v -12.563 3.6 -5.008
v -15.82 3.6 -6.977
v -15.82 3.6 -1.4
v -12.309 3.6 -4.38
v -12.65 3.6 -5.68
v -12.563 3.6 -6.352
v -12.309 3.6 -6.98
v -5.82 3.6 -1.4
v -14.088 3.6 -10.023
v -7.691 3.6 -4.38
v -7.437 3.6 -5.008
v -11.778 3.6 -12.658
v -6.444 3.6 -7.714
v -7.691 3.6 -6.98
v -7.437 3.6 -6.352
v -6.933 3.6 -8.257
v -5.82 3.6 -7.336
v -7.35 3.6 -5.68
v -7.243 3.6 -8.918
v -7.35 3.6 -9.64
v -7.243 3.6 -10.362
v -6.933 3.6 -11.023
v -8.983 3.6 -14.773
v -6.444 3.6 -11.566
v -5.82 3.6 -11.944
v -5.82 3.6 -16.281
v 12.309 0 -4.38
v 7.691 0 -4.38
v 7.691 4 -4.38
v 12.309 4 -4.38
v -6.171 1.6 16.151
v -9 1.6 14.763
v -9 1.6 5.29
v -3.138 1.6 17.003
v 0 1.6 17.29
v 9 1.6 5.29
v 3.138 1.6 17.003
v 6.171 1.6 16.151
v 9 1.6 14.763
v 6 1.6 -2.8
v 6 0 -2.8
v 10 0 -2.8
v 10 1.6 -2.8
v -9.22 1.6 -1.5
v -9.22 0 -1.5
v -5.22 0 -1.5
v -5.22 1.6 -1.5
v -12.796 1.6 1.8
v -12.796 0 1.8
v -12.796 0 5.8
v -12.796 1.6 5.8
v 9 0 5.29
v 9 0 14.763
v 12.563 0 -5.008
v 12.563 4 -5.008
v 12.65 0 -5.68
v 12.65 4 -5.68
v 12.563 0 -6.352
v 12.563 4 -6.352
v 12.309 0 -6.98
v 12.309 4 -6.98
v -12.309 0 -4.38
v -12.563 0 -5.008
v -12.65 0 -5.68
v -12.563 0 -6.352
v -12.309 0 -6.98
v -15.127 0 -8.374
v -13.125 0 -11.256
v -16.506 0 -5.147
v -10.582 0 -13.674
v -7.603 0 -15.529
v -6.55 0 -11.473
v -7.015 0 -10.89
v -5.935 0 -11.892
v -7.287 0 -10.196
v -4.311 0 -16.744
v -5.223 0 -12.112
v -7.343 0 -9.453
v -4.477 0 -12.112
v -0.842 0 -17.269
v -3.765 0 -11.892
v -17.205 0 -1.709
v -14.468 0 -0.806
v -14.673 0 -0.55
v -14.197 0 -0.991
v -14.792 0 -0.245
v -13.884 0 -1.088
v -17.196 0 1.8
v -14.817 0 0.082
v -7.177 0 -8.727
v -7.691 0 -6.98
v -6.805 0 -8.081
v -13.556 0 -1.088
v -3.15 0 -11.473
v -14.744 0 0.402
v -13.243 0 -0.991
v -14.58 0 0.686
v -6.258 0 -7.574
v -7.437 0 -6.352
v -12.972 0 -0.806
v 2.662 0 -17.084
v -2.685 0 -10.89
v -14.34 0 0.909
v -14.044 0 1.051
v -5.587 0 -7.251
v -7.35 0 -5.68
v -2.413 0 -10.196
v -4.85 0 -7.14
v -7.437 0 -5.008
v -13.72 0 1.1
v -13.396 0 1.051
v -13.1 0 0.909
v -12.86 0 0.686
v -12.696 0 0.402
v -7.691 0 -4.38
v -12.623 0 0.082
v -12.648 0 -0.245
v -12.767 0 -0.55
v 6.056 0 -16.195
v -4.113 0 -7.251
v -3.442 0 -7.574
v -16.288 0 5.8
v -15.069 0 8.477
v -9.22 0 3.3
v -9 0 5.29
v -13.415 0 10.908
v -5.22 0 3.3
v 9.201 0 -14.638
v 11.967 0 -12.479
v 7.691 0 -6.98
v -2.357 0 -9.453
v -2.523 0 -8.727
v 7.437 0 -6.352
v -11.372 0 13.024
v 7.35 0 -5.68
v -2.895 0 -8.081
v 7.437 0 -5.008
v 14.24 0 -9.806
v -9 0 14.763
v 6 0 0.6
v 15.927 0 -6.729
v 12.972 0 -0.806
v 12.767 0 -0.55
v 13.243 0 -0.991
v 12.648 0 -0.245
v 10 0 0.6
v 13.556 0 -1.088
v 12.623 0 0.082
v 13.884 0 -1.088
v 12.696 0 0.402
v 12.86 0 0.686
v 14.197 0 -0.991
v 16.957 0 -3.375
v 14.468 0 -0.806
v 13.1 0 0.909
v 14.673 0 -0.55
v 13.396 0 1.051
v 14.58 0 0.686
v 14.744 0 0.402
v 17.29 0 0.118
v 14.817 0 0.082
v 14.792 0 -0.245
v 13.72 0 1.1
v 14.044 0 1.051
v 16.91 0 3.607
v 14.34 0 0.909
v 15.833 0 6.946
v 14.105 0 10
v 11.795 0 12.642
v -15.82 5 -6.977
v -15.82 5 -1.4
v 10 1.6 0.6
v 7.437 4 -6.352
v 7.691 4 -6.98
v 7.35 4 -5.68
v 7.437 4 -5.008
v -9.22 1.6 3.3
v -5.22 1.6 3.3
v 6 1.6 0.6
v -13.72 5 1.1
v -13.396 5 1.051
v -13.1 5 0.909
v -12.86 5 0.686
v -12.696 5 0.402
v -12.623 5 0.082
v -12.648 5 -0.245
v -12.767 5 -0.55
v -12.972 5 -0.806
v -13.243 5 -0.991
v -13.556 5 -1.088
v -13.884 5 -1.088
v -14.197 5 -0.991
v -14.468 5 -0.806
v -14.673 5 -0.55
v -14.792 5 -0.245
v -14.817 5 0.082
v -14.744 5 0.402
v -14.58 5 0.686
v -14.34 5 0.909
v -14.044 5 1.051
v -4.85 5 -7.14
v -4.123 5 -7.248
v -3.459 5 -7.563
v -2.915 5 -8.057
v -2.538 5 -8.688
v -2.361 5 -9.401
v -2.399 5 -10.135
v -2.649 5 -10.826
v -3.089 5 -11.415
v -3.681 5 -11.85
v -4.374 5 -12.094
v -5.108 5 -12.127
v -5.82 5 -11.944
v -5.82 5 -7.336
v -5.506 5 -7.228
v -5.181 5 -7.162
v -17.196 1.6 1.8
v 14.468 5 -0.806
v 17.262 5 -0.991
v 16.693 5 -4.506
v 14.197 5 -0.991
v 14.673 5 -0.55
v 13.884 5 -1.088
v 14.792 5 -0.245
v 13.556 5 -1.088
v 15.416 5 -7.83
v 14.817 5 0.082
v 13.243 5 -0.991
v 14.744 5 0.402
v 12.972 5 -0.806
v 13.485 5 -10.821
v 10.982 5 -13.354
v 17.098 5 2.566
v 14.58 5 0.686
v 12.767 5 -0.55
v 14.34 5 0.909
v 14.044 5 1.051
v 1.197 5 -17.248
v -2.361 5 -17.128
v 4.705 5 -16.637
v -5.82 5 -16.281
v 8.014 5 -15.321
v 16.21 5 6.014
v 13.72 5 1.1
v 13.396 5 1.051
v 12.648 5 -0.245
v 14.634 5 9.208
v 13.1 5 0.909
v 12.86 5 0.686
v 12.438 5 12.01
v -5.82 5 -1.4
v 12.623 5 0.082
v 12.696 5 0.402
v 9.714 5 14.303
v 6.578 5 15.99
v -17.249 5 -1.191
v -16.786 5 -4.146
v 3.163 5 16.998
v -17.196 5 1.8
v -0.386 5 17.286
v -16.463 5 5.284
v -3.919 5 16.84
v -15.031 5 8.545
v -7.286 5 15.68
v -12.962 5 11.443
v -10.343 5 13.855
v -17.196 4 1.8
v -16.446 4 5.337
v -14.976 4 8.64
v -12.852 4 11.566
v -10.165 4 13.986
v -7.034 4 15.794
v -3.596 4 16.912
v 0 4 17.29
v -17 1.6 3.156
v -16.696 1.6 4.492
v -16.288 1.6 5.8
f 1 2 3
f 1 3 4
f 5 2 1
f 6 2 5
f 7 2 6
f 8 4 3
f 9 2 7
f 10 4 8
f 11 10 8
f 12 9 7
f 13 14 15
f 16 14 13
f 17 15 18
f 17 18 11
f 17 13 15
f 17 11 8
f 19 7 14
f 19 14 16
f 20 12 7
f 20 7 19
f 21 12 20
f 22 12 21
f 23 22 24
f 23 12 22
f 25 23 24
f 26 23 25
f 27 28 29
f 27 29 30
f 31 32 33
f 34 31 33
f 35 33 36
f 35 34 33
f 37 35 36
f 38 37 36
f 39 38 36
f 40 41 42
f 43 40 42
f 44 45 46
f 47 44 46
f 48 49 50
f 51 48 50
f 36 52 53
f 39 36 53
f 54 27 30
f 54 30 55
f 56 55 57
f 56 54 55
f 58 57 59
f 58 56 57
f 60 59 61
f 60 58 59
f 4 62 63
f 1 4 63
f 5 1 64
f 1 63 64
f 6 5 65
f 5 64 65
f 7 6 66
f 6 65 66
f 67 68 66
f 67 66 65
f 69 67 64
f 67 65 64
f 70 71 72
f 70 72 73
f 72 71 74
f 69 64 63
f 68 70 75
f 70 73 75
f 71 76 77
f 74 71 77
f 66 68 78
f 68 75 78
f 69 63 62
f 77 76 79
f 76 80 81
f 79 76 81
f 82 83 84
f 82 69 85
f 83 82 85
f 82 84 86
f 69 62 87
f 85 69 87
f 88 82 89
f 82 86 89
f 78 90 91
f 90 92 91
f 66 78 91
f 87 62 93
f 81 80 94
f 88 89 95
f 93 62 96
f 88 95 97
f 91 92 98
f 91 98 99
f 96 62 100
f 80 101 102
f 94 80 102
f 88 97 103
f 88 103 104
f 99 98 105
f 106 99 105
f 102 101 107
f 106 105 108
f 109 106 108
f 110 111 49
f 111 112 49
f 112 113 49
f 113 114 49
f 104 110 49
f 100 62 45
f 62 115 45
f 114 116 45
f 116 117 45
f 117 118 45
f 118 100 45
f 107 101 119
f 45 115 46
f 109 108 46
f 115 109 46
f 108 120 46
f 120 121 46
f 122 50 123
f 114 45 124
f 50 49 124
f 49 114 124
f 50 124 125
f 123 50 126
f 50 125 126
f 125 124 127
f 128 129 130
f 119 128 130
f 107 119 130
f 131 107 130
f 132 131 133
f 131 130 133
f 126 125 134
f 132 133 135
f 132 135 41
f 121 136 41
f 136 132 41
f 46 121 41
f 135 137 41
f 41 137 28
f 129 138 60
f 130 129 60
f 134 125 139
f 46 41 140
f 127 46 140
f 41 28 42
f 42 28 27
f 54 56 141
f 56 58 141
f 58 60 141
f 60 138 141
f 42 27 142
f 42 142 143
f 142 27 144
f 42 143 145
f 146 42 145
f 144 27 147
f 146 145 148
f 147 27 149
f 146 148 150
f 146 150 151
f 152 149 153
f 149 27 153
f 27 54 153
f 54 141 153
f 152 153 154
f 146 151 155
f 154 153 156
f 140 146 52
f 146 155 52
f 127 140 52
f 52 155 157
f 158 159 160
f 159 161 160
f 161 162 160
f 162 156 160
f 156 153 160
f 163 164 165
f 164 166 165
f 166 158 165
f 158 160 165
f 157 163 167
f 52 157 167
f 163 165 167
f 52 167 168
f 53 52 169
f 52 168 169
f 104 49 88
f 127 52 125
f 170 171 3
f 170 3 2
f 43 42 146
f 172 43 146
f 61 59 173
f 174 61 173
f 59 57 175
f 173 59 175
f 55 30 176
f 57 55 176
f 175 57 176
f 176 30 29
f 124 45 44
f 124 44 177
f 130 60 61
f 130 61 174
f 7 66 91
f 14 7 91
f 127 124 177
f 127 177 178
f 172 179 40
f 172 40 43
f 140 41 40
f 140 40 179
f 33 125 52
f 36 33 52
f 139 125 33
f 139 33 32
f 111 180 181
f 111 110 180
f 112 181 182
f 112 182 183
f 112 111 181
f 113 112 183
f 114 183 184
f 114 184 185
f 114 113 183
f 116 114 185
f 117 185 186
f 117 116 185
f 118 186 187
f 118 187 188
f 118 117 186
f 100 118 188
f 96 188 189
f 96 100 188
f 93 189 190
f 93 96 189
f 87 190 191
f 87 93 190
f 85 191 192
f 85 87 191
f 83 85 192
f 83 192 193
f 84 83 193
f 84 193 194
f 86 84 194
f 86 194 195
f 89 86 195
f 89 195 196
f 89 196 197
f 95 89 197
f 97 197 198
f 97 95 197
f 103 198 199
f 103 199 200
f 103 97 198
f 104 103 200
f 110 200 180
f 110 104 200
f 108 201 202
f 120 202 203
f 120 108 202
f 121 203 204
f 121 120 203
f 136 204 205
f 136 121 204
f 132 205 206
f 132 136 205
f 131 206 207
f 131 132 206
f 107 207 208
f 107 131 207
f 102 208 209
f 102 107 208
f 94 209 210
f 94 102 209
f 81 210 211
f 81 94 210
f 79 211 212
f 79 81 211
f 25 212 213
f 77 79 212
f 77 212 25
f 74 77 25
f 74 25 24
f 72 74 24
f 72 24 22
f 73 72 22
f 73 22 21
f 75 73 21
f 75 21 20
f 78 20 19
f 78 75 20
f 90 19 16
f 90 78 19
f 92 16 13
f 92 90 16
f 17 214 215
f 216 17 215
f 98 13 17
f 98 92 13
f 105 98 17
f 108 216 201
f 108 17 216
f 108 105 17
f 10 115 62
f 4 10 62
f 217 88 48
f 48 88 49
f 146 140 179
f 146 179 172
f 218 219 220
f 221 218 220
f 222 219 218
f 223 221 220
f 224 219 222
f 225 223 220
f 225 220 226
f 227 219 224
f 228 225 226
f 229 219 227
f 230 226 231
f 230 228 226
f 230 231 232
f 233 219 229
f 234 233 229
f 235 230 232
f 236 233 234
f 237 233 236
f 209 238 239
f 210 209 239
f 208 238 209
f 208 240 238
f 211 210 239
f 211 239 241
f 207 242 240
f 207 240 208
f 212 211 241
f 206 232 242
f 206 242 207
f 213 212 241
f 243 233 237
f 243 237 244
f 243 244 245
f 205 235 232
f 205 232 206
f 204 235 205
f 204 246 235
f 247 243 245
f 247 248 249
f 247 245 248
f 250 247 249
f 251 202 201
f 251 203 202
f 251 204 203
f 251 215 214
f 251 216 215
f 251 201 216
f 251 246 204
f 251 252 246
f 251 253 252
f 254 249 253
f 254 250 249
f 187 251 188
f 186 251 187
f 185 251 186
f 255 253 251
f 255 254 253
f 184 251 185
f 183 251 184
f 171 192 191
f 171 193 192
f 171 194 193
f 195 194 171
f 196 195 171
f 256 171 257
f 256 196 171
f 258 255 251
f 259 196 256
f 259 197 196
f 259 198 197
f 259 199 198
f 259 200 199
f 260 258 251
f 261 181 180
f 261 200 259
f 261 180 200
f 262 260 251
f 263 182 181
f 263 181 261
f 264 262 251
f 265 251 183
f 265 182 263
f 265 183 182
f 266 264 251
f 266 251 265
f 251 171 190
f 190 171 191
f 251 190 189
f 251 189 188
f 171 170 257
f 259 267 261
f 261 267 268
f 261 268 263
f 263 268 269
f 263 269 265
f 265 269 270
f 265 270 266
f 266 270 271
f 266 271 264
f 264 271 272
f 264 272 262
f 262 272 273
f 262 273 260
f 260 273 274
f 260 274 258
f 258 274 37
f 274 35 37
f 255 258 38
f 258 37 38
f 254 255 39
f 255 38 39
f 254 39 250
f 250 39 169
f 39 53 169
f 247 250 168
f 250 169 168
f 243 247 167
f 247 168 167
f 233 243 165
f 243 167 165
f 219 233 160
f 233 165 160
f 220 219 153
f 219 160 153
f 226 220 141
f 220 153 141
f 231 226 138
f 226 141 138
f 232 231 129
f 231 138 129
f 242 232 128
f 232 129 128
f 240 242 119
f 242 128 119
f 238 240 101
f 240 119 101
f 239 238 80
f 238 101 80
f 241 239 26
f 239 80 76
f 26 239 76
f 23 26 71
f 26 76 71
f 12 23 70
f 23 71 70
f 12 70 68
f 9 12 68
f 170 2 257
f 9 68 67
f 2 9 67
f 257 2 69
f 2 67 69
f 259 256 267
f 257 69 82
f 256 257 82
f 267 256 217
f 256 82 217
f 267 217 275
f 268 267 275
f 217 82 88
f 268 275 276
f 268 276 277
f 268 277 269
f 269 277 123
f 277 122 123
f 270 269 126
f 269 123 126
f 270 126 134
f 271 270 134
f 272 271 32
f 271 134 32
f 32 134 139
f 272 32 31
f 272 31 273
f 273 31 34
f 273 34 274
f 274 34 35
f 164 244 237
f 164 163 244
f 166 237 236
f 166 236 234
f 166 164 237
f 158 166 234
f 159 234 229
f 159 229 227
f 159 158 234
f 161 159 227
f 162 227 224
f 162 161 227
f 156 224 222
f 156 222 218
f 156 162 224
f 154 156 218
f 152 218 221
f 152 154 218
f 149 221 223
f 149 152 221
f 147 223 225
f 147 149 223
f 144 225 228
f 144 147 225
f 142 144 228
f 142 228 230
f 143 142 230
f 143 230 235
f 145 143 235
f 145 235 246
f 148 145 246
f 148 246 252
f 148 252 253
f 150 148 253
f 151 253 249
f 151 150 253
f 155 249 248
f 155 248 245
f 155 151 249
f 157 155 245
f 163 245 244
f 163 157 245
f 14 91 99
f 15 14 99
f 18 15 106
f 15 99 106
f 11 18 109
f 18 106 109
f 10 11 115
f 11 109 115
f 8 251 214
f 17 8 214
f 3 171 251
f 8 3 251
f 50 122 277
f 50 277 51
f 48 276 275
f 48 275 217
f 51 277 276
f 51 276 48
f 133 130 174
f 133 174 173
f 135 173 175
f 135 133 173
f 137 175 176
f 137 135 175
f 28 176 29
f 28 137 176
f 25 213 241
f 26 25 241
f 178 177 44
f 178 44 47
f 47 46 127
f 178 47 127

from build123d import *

# Parameters (mm, degrees)
SKETCH_1_R          = 17.29
SKETCH_1_R_2        = 1.1
SKETCH_1_R_3        = 2.5
EXTRUDE_1_DEPTH     = 4
SKETCH_2_W          = 4
SKETCH_2_H          = 4.8
SKETCH_2_H_2        = 3.4
SKETCH_2_W_2        = 4.4
SKETCH_2_H_3        = 4
SKETCH_2_W_3        = 18
SKETCH_2_H_4        = 12
CUT_EXTRUDE_1_DEPTH = 1.6
SKETCH_3_R          = 17.29
SKETCH_3_R_2        = 2.5
SKETCH_3_R_3        = 1.1
EXTRUDE_2_DEPTH     = 1
SKETCH_4_W          = 10
SKETCH_4_H          = 15
CUT_EXTRUDE_2_DEPTH = 1.4


with BuildPart() as part:
    # 草图1 → 凸台-拉伸1 (new body)
    with BuildSketch(Plane(origin=(0, 0, 0), x_dir=(1, 0, 0), z_dir=(0, 1, 0))):
        with Locations(Location((0, 0, 0), (0, 0, 270))):
            Circle(SKETCH_1_R)
        with Locations(Location((-13.72, 0, 0), (0, 0, 270))):
            Circle(SKETCH_1_R_2, mode=Mode.SUBTRACT)
        with Locations(Location((13.72, 0, 0), (0, 0, 270))):
            Circle(SKETCH_1_R_2, mode=Mode.SUBTRACT)
        with Locations(Location((-4.85, 9.64, 0), (0, 0, 270))):
            Circle(SKETCH_1_R_3, mode=Mode.SUBTRACT)
        with BuildLine():
            Line((-12.309220648, 6.98), (-7.690779352, 6.98))
            ThreePointArc((-7.690779352, 6.98), (-7.35, 5.68), (-7.690779352, 4.38))
            Line((-7.690779352, 4.38), (-12.309220648, 4.38))
            ThreePointArc((-12.309220648, 4.38), (-12.65, 5.68), (-12.309220648, 6.98))
        make_face(mode=Mode.SUBTRACT)
        with BuildLine():
            Line((12.309220648, 6.98), (7.690779352, 6.98))
            ThreePointArc((7.690779352, 6.98), (7.35, 5.68), (7.690779352, 4.38))
            Line((7.690779352, 4.38), (12.309220648, 4.38))
            ThreePointArc((12.309220648, 4.38), (12.65, 5.68), (12.309220648, 6.98))
        make_face(mode=Mode.SUBTRACT)
    extrude(amount=EXTRUDE_1_DEPTH)

    # 草图2 → 切除-拉伸1 (cut)
    with BuildSketch(Plane.XZ):
        with Locations((-7.22, 0.9)):
            Rectangle(SKETCH_2_W, SKETCH_2_H)
        with Locations((8, -1.1)):
            Rectangle(SKETCH_2_W, SKETCH_2_H_2)
        with Locations((-14.996048965, 3.8)):
            Rectangle(SKETCH_2_W_2, SKETCH_2_H_3)
        with Locations((0, 11.29)):
            Rectangle(SKETCH_2_W_3, SKETCH_2_H_4)
    extrude(amount=-CUT_EXTRUDE_1_DEPTH, mode=Mode.SUBTRACT)

    # 草图3 → 凸台-拉伸2 (add)
    with BuildSketch(Plane(origin=(0, 4, 0), x_dir=(1, 0, 0), z_dir=(0, 1, 0))):
        with Locations(Location((0, 0, 0), (0, 0, 185.97568604))):
            Circle(SKETCH_3_R)
        with Locations(Location((-4.85, 9.64, 0), (0, 0, 270))):
            Circle(SKETCH_3_R_2, mode=Mode.SUBTRACT)
        with Locations(Location((-13.72, 0, 0), (0, 0, 270))):
            Circle(SKETCH_3_R_3, mode=Mode.SUBTRACT)
        with Locations(Location((13.72, 0, 0), (0, 0, 270))):
            Circle(SKETCH_3_R_3, mode=Mode.SUBTRACT)
    extrude(amount=EXTRUDE_2_DEPTH)

    # 草图4 → 切除-拉伸2 (cut)
    with BuildSketch(Plane(origin=(0, 5, 0), x_dir=(1, 0, 0), z_dir=(0, 1, 0))):
        with Locations((-10.82, 8.9)):
            Rectangle(SKETCH_4_W, SKETCH_4_H)
    extrude(amount=-CUT_EXTRUDE_2_DEPTH, mode=Mode.SUBTRACT)


solid = part.part
